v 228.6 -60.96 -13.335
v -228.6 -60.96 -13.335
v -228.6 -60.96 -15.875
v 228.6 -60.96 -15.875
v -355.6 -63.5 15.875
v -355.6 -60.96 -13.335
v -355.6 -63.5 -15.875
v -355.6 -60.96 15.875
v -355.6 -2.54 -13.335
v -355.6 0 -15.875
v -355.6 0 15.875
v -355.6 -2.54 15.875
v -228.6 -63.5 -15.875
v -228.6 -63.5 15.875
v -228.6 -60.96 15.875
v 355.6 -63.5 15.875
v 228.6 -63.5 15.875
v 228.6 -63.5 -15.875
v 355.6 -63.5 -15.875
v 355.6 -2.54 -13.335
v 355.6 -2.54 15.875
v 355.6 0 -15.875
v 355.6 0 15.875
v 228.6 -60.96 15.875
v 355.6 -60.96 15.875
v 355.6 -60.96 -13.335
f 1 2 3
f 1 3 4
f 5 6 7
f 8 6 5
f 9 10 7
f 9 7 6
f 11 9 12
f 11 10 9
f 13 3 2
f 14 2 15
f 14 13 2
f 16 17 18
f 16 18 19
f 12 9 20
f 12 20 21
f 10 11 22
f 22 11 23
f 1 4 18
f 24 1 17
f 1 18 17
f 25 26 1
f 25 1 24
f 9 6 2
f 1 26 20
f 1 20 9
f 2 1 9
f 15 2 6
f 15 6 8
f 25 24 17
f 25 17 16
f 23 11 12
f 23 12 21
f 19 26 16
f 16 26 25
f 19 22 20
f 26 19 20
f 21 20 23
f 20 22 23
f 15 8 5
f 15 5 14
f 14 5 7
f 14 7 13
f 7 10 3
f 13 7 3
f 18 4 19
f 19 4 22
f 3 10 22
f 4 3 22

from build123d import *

# Parameters (mm, degrees)
F0_W     = 711.2
F0_H     = 31.75
F1_DEPTH = 63.5
F2_W     = 58.42
F2_H     = 29.21
F3_DEPTH = 711.201
F4_W     = 457.2
F4_H     = 31.75
F5_DEPTH = 2.54


with BuildPart() as f1:
    # F0 (on Front) → F1 (new body)
    with BuildSketch(Plane.XZ):
        Rectangle(F0_W, F0_H)
    extrude(amount=F1_DEPTH)

    # F2 (on face) → F3 (cut, through all)
    with BuildSketch(Plane.YZ.offset(355.6)):
        with Locations((-31.75, 1.27)):
            Rectangle(F2_W, F2_H)
    extrude(amount=-F3_DEPTH, mode=Mode.SUBTRACT)

    # F4 (on face) → F5 (cut)
    with BuildSketch(Plane.XZ.offset(63.5)):
        Rectangle(F4_W, F4_H)
    extrude(amount=-F5_DEPTH, mode=Mode.SUBTRACT)


solid = f1.part
